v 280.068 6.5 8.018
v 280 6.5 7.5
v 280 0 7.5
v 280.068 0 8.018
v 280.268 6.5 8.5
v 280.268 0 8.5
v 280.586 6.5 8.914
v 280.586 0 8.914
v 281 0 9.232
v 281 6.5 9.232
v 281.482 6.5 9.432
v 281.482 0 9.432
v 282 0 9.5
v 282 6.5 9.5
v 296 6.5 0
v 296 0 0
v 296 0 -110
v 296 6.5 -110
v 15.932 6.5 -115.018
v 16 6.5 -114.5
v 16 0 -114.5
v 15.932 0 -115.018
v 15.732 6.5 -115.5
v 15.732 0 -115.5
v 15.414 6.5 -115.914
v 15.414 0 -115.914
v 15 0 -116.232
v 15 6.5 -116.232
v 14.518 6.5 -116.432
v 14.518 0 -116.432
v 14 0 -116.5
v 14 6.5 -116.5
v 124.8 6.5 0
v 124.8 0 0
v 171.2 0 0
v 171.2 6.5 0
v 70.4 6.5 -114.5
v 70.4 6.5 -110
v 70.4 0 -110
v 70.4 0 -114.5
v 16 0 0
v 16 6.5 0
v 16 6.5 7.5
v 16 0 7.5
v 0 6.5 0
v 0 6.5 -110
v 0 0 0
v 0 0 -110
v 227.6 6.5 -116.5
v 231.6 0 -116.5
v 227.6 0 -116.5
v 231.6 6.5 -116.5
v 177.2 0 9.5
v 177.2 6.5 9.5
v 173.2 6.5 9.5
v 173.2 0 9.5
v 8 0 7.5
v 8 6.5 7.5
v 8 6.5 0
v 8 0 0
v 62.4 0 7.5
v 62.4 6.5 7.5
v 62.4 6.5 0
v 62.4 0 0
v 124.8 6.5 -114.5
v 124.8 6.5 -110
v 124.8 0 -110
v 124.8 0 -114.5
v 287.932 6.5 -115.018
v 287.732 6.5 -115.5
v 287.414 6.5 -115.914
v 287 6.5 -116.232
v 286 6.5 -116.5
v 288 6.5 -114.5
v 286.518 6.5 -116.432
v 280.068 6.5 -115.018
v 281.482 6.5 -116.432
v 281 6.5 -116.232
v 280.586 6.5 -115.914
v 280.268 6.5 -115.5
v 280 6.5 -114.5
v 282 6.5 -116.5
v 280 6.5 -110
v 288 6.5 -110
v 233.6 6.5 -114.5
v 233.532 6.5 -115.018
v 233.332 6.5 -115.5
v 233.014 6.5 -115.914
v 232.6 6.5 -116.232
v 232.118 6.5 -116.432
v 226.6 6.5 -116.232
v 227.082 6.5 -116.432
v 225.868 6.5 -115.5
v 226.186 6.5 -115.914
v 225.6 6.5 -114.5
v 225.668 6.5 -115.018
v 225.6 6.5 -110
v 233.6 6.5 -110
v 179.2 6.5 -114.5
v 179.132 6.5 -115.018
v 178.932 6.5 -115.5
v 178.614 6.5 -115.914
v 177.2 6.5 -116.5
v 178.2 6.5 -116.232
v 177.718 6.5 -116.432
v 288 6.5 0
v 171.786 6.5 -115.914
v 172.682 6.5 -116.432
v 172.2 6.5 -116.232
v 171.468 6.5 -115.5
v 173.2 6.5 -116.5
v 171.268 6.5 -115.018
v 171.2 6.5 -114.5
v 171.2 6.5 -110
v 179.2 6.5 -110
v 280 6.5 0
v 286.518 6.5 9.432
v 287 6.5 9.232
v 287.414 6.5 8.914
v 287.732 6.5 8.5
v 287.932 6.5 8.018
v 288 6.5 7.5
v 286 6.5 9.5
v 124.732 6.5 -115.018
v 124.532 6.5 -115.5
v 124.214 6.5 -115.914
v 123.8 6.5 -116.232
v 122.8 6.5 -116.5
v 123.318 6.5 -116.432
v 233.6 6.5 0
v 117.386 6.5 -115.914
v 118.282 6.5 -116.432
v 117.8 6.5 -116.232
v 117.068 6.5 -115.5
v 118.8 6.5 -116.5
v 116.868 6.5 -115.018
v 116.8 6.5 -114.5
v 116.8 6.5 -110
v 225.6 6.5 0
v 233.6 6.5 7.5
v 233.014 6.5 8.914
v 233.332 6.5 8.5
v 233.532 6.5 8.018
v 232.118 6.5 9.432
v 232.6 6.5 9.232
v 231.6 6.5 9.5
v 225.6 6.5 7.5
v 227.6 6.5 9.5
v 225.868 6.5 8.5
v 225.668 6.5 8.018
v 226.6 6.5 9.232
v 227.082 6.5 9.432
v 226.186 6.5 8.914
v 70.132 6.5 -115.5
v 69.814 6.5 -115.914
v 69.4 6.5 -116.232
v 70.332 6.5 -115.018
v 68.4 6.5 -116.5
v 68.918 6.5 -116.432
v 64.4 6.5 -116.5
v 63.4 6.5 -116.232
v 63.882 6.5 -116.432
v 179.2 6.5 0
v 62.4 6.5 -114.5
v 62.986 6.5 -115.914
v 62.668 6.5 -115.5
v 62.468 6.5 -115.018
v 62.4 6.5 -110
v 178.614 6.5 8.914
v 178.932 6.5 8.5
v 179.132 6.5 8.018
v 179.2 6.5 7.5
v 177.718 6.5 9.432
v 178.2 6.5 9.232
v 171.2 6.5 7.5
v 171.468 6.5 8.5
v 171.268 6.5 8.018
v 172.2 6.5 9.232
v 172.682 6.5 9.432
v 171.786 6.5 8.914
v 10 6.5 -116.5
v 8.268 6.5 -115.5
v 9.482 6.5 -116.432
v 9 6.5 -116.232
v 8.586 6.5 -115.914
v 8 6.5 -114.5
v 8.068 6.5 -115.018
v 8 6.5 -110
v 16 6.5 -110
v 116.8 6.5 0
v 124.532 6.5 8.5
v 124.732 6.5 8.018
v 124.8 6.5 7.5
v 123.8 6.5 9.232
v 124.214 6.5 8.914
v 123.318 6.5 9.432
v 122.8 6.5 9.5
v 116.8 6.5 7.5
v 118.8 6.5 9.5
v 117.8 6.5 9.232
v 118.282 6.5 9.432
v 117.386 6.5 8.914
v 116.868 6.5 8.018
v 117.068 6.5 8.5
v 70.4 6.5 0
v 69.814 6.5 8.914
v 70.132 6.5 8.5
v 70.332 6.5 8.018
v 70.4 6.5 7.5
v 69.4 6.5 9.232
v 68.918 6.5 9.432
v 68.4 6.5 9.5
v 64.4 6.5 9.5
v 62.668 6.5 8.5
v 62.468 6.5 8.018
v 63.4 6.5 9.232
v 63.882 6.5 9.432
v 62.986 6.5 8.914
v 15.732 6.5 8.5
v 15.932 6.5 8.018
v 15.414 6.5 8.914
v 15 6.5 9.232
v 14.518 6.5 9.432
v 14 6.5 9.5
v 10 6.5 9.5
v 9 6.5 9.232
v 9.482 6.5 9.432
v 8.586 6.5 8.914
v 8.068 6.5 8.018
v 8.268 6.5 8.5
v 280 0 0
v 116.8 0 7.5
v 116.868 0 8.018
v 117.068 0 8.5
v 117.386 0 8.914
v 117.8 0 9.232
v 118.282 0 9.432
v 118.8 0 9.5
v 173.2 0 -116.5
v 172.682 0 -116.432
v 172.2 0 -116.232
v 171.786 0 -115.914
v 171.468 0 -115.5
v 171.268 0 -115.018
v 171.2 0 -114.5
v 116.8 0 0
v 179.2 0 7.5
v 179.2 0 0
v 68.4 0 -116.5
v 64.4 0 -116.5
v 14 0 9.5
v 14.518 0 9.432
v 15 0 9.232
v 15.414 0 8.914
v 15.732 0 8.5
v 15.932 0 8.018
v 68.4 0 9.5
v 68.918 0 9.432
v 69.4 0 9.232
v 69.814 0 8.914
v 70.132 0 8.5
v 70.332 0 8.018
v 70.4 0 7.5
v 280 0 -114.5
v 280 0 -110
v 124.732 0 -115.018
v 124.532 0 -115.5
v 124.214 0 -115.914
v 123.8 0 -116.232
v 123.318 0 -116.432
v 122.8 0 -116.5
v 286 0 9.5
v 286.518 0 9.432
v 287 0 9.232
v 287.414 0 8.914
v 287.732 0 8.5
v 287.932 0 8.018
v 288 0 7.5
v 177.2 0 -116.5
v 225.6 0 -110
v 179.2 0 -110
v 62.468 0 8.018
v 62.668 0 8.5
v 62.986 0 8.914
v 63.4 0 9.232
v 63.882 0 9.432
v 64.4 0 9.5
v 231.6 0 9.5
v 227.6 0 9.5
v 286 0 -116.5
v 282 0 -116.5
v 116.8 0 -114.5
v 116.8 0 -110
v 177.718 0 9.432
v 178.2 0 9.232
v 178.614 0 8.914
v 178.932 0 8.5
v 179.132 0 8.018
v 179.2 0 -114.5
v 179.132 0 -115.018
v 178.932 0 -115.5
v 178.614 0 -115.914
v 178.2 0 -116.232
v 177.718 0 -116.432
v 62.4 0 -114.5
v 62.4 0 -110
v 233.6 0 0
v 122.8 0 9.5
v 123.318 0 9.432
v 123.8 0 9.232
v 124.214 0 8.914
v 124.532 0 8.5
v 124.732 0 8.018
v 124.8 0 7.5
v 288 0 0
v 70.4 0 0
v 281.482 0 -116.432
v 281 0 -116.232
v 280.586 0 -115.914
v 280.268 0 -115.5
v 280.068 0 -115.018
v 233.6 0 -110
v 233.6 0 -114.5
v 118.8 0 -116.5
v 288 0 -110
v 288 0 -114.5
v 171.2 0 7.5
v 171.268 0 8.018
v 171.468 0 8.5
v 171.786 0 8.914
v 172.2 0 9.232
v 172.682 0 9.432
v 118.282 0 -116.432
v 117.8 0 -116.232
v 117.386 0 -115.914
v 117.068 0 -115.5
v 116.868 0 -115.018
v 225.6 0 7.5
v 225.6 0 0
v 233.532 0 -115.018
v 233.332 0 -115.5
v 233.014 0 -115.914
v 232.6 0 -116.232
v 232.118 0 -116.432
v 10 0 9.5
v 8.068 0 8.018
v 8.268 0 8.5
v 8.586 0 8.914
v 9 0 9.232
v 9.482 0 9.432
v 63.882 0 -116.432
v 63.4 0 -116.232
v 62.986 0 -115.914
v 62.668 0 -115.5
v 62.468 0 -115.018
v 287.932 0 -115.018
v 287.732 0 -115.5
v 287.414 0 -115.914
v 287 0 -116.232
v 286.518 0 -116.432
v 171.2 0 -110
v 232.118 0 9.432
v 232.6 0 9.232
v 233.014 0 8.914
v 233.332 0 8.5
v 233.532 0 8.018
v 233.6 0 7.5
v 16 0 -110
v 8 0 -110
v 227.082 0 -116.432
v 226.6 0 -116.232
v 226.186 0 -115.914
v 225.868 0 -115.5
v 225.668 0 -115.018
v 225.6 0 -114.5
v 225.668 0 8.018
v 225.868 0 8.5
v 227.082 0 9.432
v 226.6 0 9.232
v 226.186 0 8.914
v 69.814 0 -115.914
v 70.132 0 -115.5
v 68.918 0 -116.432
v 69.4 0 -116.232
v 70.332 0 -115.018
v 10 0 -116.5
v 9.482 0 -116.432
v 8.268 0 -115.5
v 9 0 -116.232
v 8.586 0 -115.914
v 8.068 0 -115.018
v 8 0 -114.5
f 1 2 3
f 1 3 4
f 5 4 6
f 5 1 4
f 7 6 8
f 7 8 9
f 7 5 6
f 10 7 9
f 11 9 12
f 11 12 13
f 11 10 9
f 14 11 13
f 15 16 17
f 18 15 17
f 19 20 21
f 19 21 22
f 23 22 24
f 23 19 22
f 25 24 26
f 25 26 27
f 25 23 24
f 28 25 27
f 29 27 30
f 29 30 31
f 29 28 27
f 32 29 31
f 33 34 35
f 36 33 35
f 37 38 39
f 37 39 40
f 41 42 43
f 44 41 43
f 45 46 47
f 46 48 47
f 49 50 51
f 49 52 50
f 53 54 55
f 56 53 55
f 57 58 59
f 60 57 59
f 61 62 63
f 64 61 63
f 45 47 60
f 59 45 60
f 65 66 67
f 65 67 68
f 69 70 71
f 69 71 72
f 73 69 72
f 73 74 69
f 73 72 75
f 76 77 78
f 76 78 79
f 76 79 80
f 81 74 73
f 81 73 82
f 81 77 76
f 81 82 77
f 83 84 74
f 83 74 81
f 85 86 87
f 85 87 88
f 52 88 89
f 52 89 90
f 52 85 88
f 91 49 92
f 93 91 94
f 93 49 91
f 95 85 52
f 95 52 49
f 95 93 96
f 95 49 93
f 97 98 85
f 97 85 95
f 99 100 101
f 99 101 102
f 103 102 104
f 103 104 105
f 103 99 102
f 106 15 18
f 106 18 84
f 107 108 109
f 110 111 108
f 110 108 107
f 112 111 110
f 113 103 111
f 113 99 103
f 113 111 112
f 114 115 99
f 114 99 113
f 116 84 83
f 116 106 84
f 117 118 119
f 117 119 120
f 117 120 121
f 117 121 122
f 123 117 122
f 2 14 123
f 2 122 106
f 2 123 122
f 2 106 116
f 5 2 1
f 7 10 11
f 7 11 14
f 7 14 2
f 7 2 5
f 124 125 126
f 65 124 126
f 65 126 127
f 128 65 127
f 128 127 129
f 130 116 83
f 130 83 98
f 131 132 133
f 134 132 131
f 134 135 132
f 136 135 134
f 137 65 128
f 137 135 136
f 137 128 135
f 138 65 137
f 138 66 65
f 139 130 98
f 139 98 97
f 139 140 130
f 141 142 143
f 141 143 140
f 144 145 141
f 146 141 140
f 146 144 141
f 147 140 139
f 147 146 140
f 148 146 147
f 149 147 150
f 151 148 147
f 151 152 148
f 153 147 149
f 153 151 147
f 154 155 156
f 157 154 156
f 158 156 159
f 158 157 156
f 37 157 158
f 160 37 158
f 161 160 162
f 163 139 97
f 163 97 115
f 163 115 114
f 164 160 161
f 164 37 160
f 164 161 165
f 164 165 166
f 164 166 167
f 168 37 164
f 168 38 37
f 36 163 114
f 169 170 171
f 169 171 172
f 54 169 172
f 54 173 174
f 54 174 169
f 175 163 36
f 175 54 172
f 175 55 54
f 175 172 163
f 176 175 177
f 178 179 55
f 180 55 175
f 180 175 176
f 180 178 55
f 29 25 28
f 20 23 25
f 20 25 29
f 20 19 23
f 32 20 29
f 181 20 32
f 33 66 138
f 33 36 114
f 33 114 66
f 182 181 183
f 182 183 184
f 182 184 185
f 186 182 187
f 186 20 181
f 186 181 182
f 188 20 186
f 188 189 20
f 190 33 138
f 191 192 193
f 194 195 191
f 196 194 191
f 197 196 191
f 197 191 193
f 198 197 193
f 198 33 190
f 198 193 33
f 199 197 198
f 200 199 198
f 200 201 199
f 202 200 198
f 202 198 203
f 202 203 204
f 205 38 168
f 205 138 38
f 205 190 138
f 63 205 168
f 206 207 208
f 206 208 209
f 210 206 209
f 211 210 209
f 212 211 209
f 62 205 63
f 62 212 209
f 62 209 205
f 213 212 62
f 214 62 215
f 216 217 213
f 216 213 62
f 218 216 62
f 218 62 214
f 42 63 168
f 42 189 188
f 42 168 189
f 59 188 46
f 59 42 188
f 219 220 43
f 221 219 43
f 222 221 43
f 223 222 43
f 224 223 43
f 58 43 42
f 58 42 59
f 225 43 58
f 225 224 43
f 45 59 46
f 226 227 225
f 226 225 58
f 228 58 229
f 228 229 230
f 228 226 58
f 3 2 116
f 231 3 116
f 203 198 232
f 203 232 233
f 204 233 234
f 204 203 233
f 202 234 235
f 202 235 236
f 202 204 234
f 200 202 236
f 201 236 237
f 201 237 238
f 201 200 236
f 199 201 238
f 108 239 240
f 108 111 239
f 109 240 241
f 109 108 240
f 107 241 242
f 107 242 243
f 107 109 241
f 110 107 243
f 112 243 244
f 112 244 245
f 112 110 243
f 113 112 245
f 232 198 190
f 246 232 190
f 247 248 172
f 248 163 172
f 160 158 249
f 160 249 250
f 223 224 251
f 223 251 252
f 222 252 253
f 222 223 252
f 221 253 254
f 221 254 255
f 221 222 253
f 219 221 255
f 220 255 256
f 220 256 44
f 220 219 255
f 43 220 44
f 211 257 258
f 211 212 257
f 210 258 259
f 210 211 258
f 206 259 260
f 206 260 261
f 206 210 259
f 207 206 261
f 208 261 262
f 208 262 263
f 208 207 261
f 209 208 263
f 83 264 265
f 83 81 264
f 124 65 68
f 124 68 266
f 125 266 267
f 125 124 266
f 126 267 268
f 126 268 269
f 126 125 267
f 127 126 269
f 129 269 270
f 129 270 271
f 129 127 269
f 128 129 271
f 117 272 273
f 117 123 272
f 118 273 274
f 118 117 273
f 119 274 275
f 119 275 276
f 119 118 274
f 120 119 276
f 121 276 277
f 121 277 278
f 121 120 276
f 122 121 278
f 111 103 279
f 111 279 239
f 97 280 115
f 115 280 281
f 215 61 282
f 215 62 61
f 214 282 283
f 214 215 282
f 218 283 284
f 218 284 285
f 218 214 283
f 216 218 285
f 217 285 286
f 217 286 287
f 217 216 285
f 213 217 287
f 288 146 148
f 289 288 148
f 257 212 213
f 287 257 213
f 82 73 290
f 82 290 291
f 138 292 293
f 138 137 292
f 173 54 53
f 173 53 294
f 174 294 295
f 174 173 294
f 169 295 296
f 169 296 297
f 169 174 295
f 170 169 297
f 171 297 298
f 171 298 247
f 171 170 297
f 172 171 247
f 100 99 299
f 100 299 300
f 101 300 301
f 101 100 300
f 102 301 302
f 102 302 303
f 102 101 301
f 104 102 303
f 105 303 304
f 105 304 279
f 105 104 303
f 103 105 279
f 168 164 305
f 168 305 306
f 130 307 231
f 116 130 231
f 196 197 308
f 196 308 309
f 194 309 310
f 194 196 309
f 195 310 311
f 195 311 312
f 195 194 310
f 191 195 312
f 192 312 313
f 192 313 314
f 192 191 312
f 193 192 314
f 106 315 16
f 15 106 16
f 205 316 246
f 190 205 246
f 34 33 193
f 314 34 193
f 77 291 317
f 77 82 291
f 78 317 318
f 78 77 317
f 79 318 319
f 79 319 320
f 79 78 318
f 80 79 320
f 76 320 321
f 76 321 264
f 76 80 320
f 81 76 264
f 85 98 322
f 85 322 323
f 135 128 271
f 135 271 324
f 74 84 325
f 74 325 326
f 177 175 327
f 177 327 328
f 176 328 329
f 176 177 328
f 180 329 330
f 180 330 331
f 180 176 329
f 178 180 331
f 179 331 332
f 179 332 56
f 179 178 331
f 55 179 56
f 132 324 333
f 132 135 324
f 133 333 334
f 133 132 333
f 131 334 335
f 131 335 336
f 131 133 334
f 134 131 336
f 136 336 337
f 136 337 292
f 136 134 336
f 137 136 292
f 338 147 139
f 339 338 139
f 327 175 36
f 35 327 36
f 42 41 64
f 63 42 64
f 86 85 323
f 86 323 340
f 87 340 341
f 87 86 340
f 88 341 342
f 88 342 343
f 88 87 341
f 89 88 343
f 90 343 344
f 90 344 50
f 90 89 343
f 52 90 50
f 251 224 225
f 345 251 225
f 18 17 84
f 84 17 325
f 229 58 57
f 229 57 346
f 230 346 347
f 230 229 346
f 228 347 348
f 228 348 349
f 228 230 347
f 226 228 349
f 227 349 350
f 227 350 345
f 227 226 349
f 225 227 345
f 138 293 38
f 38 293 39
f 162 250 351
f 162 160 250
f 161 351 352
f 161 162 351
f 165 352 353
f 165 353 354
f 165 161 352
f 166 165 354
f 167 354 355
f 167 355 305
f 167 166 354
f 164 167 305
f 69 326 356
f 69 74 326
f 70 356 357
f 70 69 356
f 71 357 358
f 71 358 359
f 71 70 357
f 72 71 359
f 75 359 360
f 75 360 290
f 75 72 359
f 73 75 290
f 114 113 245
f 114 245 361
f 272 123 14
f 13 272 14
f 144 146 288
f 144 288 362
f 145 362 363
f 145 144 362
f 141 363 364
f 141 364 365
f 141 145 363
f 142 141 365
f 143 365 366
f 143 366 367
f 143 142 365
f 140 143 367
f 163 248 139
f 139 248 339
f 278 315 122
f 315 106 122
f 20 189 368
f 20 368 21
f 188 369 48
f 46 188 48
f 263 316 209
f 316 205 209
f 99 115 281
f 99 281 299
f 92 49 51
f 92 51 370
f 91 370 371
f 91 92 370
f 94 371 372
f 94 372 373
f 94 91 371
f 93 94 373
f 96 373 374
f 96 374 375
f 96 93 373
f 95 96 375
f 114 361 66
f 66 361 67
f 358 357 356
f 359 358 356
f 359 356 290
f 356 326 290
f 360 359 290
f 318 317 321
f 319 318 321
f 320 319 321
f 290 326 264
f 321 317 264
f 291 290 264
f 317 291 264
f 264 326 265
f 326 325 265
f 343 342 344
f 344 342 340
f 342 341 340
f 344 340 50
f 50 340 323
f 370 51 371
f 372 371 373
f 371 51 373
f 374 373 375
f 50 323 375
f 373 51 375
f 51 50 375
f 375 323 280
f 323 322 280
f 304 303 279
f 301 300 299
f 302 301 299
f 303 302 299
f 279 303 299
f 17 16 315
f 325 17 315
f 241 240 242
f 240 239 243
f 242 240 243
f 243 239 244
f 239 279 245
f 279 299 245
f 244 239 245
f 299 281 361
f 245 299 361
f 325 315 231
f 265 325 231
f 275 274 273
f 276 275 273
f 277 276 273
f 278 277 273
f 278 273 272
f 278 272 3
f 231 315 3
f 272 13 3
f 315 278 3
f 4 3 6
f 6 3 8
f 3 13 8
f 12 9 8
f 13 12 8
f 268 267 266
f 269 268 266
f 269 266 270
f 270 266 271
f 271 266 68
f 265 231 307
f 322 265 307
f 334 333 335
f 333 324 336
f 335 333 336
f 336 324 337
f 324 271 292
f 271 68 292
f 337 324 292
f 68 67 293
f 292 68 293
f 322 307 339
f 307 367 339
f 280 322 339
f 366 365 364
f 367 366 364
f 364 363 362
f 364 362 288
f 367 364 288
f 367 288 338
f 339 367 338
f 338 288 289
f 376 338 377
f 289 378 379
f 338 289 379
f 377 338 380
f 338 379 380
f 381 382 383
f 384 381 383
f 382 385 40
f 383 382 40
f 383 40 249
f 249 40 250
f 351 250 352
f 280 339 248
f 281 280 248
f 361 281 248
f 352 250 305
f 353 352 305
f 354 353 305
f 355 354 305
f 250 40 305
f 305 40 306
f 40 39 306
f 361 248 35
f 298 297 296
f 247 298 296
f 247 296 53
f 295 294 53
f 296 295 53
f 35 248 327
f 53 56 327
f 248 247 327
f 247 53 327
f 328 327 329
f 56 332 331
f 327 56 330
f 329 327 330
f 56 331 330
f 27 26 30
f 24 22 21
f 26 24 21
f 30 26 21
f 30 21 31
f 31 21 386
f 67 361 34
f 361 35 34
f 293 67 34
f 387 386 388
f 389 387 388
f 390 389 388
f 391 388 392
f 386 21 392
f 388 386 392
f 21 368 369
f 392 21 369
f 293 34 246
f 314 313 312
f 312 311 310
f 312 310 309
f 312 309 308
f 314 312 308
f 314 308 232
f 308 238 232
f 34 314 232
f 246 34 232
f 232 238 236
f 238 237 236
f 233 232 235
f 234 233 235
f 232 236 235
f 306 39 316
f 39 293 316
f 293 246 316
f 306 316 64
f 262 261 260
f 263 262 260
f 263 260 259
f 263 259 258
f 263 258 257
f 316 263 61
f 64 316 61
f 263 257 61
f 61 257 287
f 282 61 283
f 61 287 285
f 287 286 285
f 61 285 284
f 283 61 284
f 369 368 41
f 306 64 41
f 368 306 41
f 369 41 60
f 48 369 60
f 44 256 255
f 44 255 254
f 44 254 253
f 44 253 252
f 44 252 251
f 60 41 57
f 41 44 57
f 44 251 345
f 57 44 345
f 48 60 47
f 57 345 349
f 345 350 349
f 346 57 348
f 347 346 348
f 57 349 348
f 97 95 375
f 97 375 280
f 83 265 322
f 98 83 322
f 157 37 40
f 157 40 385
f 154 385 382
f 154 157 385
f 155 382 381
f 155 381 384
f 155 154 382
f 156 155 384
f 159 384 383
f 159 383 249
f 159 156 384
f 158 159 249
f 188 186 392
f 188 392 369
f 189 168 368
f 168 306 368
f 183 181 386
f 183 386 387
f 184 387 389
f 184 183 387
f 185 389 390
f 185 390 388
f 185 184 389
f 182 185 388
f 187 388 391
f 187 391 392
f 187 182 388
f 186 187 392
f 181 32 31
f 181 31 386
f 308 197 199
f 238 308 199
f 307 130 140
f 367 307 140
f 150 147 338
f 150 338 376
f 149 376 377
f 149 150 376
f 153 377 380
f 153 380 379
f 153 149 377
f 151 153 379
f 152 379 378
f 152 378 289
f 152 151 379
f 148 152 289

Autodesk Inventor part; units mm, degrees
ref_plane "YZ Plane" through (0, 0, 0) normal (1, 0, 0) x (0, 1, 0)
ref_plane "XZ Plane" through (0, 0, 0) normal (0, 1, 0) x (-1, 0, 0)
ref_plane "XY Plane" through (0, 0, 0) normal (0, 0, 1) x (1, 0, 0)
sketch "Sketch1" plane through (0, 0, 0) normal (0, 1, 0) x (-1, 0, 0)
  line L0 (0, 0) -> (-296, 0)
  line L1 (-296, 0) -> (-296, -110)
  line L2 (-296, -110) -> (0, -110)
  line L3 (0, -110) -> (0, 0)
  dimension "d0" = 296
  dimension "d1" = 110
extrude "Extrusion1" add sketch "Sketch1" along normal blind 6.5
sketch "Sketch2" plane through (0, 6.5, 0) normal (0, 1, 0) x (1, 0, 0)
  line L0 (296, 0) -> (296, 110) projected
  line L1 (296, 110) -> (0, 110) projected
  line L2 (0, 110) -> (0, 0) projected
  line L3 (8, 110) -> (16, 110)
  line L4 (16, 110) -> (16, 114.5)
  line L5 (14, 116.5) -> (10, 116.5)
  line L6 (8, 114.5) -> (8, 110)
  line L7 (62.4, 110) -> (70.4, 110)
  line L8 (70.4, 110) -> (70.4, 114.5)
  line L9 (68.4, 116.5) -> (64.4, 116.5)
  line L10 (62.4, 114.5) -> (62.4, 110)
  line L11 (116.8, 110) -> (124.8, 110)
  line L12 (124.8, 110) -> (124.8, 114.5)
  line L13 (122.8, 116.5) -> (118.8, 116.5)
  line L14 (116.8, 114.5) -> (116.8, 110)
  line L15 (171.2, 110) -> (179.2, 110)
  line L16 (179.2, 110) -> (179.2, 114.5)
  line L17 (177.2, 116.5) -> (173.2, 116.5)
  line L18 (171.2, 114.5) -> (171.2, 110)
  line L19 (225.6, 110) -> (233.6, 110)
  line L20 (233.6, 110) -> (233.6, 114.5)
  line L21 (231.6, 116.5) -> (227.6, 116.5)
  line L22 (225.6, 114.5) -> (225.6, 110)
  line L23 (280, 110) -> (288, 110)
  line L24 (288, 110) -> (288, 114.5)
  line L25 (286, 116.5) -> (282, 116.5)
  line L26 (280, 114.5) -> (280, 110)
  arc A0 (10, 116.5) -> (8, 114.5) centre (10, 114.5) ccw
  arc A1 (16, 114.5) -> (14, 116.5) centre (14, 114.5) ccw
  arc A2 (64.4, 116.5) -> (62.4, 114.5) centre (64.4, 114.5) ccw
  arc A3 (70.4, 114.5) -> (68.4, 116.5) centre (68.4, 114.5) ccw
  arc A4 (118.8, 116.5) -> (116.8, 114.5) centre (118.8, 114.5) ccw
  arc A5 (124.8, 114.5) -> (122.8, 116.5) centre (122.8, 114.5) ccw
  arc A6 (173.2, 116.5) -> (171.2, 114.5) centre (173.2, 114.5) ccw
  arc A7 (179.2, 114.5) -> (177.2, 116.5) centre (177.2, 114.5) ccw
  arc A8 (227.6, 116.5) -> (225.6, 114.5) centre (227.6, 114.5) ccw
  arc A9 (233.6, 114.5) -> (231.6, 116.5) centre (231.6, 114.5) ccw
  arc A10 (282, 116.5) -> (280, 114.5) centre (282, 114.5) ccw
  arc A11 (288, 114.5) -> (286, 116.5) centre (286, 114.5) ccw
  line L27 (16, 112.25) -> (62.4, 112.25) construction
  line L28 (70.4, 112.25) -> (116.8, 112.25) construction
  line L29 (124.8, 112.25) -> (171.2, 112.25) construction
  line L30 (179.2, 112.25) -> (225.6, 112.25) construction
  line L31 (233.6, 112.25) -> (280, 112.25) construction
  line L32 (0, 55) -> (296, 55) construction
  line L33 (0, 0) -> (296, 0) projected
  line L34 (296, 0) -> (296, 110) projected
  line L35 (296, 110) -> (0, 110) projected
  line L36 (0, 110) -> (0, 0) projected
  line L37 (8, 0) -> (16, 0)
  line L38 (16, 0) -> (16, -7.5)
  line L39 (14, -9.5) -> (10, -9.5)
  line L40 (8, -7.5) -> (8, 0)
  line L41 (62.4, 0) -> (70.4, 0)
  line L42 (70.4, 0) -> (70.4, -7.5)
  line L43 (68.4, -9.5) -> (64.4, -9.5)
  line L44 (62.4, -7.5) -> (62.4, 0)
  line L45 (116.8, 0) -> (124.8, 0)
  line L46 (124.8, 0) -> (124.8, -7.5)
  line L47 (122.8, -9.5) -> (118.8, -9.5)
  line L48 (116.8, -7.5) -> (116.8, 0)
  line L49 (171.2, 0) -> (179.2, 0)
  line L50 (179.2, 0) -> (179.2, -7.5)
  line L51 (177.2, -9.5) -> (173.2, -9.5)
  line L52 (171.2, -7.5) -> (171.2, 0)
  line L53 (225.6, 0) -> (233.6, 0)
  line L54 (233.6, 0) -> (233.6, -7.5)
  line L55 (231.6, -9.5) -> (227.6, -9.5)
  line L56 (225.6, -7.5) -> (225.6, 0)
  line L57 (280, 0) -> (288, 0)
  line L58 (288, 0) -> (288, -7.5)
  line L59 (286, -9.5) -> (282, -9.5)
  line L60 (280, -7.5) -> (280, 0)
  arc A12 (8, -7.5) -> (10, -9.5) centre (10, -7.5) ccw
  arc A13 (14, -9.5) -> (16, -7.5) centre (14, -7.5) ccw
  arc A14 (62.4, -7.5) -> (64.4, -9.5) centre (64.4, -7.5) ccw
  arc A15 (68.4, -9.5) -> (70.4, -7.5) centre (68.4, -7.5) ccw
  arc A16 (116.8, -7.5) -> (118.8, -9.5) centre (118.8, -7.5) ccw
  arc A17 (122.8, -9.5) -> (124.8, -7.5) centre (122.8, -7.5) ccw
  arc A18 (171.2, -7.5) -> (173.2, -9.5) centre (173.2, -7.5) ccw
  arc A19 (177.2, -9.5) -> (179.2, -7.5) centre (177.2, -7.5) ccw
  arc A20 (225.6, -7.5) -> (227.6, -9.5) centre (227.6, -7.5) ccw
  arc A21 (231.6, -9.5) -> (233.6, -7.5) centre (231.6, -7.5) ccw
  arc A22 (280, -7.5) -> (282, -9.5) centre (282, -7.5) ccw
  arc A23 (286, -9.5) -> (288, -7.5) centre (286, -7.5) ccw
  dimension "d4" = 2
  dimension "d5" = 8
  dimension "d6" = 8
  dimension "d7" = 8
  dimension "d8" = 8
  dimension "d9" = 8
  dimension "d10" = 8
  dimension "d11" = 6.5
  dimension "d12" = 8
  dimension "d13" = 8
  dimension "d16" = 2
  dimension "d17" = 9.5
extrude "Extrusion3" add sketch "Sketch2" against normal blind 6.5 contours L58 A23 L59 A22 L60 L33 | L1 L26 A10 L25 A11 L24 | L54 A21 L55 A20 L56 L33 | L1 L22 A8 L21 A9 L20 | L50 A19 L51 A18 L52 L33 | L1 L18 A6 L17 A7 L16 | L46 A17 L47 A16 L48 L33 | L1 L14 A4 L13 A5 L12 | L42 A15 L43 A14 L44 L33 | L1 L10 A2 L9 A3 L8 | L38 A13 L39 A12 L40 L33 | L1 L6 A0 L5 A1 L4
equation "\"d6\" = d5"
equation "\"d7\" = d6"
equation "\"d8\" = d7"
equation "\"d9\" = d8"
equation "\"d10\" = d9"
equation "\"d13\" = d12"
properties part number "spool_stand_brace_bottom" material "Plywood, Finish"
